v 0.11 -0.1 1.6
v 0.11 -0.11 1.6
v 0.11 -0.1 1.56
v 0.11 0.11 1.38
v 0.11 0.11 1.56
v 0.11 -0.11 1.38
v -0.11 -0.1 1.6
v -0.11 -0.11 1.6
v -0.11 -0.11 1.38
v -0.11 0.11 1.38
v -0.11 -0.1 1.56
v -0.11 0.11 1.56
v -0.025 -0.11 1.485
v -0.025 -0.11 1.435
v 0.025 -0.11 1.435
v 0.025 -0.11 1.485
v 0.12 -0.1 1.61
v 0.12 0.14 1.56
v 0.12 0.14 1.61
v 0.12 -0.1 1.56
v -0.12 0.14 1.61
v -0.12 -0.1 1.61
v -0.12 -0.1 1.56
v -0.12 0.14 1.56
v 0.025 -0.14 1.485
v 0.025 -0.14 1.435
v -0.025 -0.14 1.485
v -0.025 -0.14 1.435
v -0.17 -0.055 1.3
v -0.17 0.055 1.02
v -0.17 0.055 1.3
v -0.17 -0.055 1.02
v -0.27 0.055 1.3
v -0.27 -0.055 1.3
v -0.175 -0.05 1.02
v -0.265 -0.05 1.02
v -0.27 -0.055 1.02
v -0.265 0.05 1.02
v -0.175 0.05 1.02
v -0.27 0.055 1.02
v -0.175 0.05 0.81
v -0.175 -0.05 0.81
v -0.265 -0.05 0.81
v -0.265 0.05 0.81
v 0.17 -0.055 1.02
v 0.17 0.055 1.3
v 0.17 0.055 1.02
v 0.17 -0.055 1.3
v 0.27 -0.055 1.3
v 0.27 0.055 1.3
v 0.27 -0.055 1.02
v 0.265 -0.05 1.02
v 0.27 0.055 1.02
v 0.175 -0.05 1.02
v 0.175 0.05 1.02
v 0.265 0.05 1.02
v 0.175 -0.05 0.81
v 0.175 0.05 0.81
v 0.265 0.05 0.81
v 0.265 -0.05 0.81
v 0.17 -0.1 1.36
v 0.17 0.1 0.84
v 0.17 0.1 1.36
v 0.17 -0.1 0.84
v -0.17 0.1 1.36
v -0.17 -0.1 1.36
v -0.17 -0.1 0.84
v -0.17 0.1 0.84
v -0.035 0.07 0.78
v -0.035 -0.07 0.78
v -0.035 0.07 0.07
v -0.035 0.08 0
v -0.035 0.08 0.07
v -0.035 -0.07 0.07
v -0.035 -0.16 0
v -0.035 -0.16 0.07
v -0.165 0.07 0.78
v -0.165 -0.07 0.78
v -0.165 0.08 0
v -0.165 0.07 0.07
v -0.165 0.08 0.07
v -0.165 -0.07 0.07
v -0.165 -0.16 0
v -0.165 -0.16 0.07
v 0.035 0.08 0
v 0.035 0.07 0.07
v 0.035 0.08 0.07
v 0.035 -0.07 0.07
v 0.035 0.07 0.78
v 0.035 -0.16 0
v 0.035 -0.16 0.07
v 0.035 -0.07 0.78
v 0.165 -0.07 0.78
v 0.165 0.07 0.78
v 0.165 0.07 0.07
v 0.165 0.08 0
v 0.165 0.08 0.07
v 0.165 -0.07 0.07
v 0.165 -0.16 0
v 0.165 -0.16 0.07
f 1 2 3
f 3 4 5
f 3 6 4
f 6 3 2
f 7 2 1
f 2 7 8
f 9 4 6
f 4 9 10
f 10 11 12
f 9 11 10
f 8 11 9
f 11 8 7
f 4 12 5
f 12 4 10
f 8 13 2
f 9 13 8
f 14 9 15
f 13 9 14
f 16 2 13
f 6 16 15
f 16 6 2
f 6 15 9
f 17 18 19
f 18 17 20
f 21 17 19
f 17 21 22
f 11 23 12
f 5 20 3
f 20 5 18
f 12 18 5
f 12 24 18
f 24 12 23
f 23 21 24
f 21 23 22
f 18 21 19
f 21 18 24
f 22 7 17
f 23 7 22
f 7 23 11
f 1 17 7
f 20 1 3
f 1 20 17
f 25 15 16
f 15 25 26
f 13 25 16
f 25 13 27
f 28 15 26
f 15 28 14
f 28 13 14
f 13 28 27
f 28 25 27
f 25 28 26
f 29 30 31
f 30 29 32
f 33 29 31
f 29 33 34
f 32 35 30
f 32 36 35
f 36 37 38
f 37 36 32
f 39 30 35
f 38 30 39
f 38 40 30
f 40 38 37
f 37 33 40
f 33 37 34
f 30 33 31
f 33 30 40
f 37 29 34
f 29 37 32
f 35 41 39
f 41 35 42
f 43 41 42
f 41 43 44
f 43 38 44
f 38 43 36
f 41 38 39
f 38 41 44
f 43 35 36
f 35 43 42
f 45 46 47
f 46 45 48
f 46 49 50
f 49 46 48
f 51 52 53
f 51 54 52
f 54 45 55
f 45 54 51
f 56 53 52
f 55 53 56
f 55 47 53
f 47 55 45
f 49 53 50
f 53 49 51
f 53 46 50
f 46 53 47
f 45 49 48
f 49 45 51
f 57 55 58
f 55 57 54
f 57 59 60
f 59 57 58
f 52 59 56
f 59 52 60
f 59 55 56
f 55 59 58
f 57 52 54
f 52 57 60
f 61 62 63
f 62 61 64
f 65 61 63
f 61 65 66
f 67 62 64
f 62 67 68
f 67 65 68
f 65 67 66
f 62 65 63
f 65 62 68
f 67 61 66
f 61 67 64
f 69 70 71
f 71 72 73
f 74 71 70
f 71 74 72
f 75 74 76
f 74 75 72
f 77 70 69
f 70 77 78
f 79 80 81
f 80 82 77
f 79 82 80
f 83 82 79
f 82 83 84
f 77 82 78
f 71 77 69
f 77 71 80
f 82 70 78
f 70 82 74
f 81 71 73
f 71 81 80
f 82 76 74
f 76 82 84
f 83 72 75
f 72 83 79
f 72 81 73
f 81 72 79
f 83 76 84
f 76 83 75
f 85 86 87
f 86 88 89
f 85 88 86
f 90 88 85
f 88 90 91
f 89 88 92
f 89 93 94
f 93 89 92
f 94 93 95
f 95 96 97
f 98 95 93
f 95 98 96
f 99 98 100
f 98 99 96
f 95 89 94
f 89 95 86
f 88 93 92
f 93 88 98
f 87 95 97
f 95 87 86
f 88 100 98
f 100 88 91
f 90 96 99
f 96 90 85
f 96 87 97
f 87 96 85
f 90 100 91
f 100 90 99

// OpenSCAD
// ============================================================================
// agent_basic.scad - ScadRig 基础角色（AirportSim 角色代理）
//
// 约定（AGENT_GUIDE/ScadRig.md）：
//   * 1 unit = 1 m，Z-up；根骨骼原点 = 两脚间地面投影（z=0）
//   * bone_ 前缀 module = 骨骼；调用点外层 translate/rotate = 绑定 pivot
//   * 顶层 anim_<name> 变量 = 动画 clip（时间秒，rot 为度，OpenSCAD rotate 语义）
//   * ROLECOLOR 纯品红 = 运行时换色占位（职业色/调色板色）
//   * 面朝 -Y（引擎空间 +Z）
//
// 在原版 OpenSCAD / ScadStudio 中直接打开即显示绑定姿态。
// ============================================================================

ROLECOLOR = [1, 0, 1];          // 换色占位（躯干 + 上臂袖子）
SKIN     = [0.92, 0.76, 0.62];
PANTS    = [0.25, 0.25, 0.30];
SHOES    = [0.15, 0.15, 0.15];
HAIR     = [0.20, 0.14, 0.10];

// ---- 部件 helper（非骨骼，几何折叠进所属骨骼） ----

module part_arm() {            // 肩 pivot 在原点，手臂垂下（-Z）
    color(ROLECOLOR) translate([0, 0, -0.14]) cube([0.10, 0.11, 0.28], center = true); // 袖子
    color(SKIN)      translate([0, 0, -0.38]) cube([0.09, 0.10, 0.22], center = true); // 小臂+手
}

module part_leg() {            // 髋 pivot 在原点，腿垂下（-Z）
    color(PANTS) translate([0, 0, -0.38])          cube([0.13, 0.14, 0.76], center = true);
    color(SHOES) translate([0, -0.04, -0.745])     cube([0.13, 0.24, 0.07], center = true); // 鞋尖朝 -Y
}

// ---- 骨骼层级 ----

module bone_head() {
    color(SKIN) translate([0, 0, 0.11])        cube([0.22, 0.22, 0.22], center = true);
    color(HAIR) translate([0, 0.02, 0.205])    cube([0.24, 0.24, 0.05], center = true);  // 头发
    color(SKIN) translate([0, -0.12, 0.08])    cube([0.05, 0.04, 0.05], center = true);  // 鼻（朝向参考）
}

module bone_arm_l() { part_arm(); }
module bone_arm_r() { mirror([1, 0, 0]) part_arm(); }   // mirror 在骨骼体内：烘进网格

module bone_leg_l() { part_leg(); }
module bone_leg_r() { mirror([1, 0, 0]) part_leg(); }

module bone_torso() {
    color(ROLECOLOR) translate([0, 0, 0.26]) cube([0.34, 0.20, 0.52], center = true);
    translate([0, 0, 0.54]) bone_head();
    translate([-0.22, 0, 0.46]) bone_arm_l();
    translate([ 0.22, 0, 0.46]) bone_arm_r();
}

module bone_root() {           // 盆骨；原点落地
    translate([0, 0, 0.84]) bone_torso();
    translate([-0.10, 0, 0.78]) bone_leg_l();
    translate([ 0.10, 0, 0.78]) bone_leg_r();
}

bone_root();

// ---- 动画 clips ----

// 待机：2s 呼吸（躯干微倾）+ 手臂微摆
anim_idle = [
    ["bone_torso", "rot", [for (t = [0 : 0.25 : 2]) [t, [2 * sin(180 * t), 0, 0]]]],
    ["bone_arm_l", "rot", [for (t = [0 : 0.5 : 2]) [t, [3 * sin(180 * t), 0,  2]]]],
    ["bone_arm_r", "rot", [for (t = [0 : 0.5 : 2]) [t, [-3 * sin(180 * t), 0, -2]]]],
];

// 行走：0.8s 腿 ±35°、臂反相 ±30°、root 上下 bob
anim_walk = [
    ["bone_leg_l", "rot", [[0, [ 35, 0, 0]], [0.4, [-35, 0, 0]], [0.8, [ 35, 0, 0]]]],
    ["bone_leg_r", "rot", [[0, [-35, 0, 0]], [0.4, [ 35, 0, 0]], [0.8, [-35, 0, 0]]]],
    ["bone_arm_l", "rot", [[0, [-30, 0, 0]], [0.4, [ 30, 0, 0]], [0.8, [-30, 0, 0]]]],
    ["bone_arm_r", "rot", [[0, [ 30, 0, 0]], [0.4, [-30, 0, 0]], [0.8, [ 30, 0, 0]]]],
    ["bone_root",  "pos", [[0, [0, 0, 0]], [0.2, [0, 0, 0.03]], [0.4, [0, 0, 0]],
                           [0.6, [0, 0, 0.03]], [0.8, [0, 0, 0]]]],
];

// 坐姿：单帧姿态（root 下沉、大腿前抬 90°、小臂搭膝）
anim_sit = [
    ["loop", false],
    ["bone_root",  "pos", [[0, [0, 0, -0.42]]]],
    ["bone_leg_l", "rot", [[0, [-90, 0, 0]]]],
    ["bone_leg_r", "rot", [[0, [-90, 0, 0]]]],
    ["bone_arm_l", "rot", [[0, [-25, 0, 0]]]],
    ["bone_arm_r", "rot", [[0, [-25, 0, 0]]]],
];

// 工作：1.5s 手臂小幅操作动作
anim_work = [
    ["bone_arm_r", "rot", [[0, [-40, 0, 0]], [0.4, [-65, 0, 0]], [0.75, [-45, 0, 0]],
                           [1.1, [-70, 0, 0]], [1.5, [-40, 0, 0]]]],
    ["bone_arm_l", "rot", [[0, [-35, 0, 0]], [0.75, [-50, 0, 0]], [1.5, [-35, 0, 0]]]],
    ["bone_torso", "rot", [[0, [4, 0, 0]], [0.75, [7, 0, 0]], [1.5, [4, 0, 0]]]],
];
